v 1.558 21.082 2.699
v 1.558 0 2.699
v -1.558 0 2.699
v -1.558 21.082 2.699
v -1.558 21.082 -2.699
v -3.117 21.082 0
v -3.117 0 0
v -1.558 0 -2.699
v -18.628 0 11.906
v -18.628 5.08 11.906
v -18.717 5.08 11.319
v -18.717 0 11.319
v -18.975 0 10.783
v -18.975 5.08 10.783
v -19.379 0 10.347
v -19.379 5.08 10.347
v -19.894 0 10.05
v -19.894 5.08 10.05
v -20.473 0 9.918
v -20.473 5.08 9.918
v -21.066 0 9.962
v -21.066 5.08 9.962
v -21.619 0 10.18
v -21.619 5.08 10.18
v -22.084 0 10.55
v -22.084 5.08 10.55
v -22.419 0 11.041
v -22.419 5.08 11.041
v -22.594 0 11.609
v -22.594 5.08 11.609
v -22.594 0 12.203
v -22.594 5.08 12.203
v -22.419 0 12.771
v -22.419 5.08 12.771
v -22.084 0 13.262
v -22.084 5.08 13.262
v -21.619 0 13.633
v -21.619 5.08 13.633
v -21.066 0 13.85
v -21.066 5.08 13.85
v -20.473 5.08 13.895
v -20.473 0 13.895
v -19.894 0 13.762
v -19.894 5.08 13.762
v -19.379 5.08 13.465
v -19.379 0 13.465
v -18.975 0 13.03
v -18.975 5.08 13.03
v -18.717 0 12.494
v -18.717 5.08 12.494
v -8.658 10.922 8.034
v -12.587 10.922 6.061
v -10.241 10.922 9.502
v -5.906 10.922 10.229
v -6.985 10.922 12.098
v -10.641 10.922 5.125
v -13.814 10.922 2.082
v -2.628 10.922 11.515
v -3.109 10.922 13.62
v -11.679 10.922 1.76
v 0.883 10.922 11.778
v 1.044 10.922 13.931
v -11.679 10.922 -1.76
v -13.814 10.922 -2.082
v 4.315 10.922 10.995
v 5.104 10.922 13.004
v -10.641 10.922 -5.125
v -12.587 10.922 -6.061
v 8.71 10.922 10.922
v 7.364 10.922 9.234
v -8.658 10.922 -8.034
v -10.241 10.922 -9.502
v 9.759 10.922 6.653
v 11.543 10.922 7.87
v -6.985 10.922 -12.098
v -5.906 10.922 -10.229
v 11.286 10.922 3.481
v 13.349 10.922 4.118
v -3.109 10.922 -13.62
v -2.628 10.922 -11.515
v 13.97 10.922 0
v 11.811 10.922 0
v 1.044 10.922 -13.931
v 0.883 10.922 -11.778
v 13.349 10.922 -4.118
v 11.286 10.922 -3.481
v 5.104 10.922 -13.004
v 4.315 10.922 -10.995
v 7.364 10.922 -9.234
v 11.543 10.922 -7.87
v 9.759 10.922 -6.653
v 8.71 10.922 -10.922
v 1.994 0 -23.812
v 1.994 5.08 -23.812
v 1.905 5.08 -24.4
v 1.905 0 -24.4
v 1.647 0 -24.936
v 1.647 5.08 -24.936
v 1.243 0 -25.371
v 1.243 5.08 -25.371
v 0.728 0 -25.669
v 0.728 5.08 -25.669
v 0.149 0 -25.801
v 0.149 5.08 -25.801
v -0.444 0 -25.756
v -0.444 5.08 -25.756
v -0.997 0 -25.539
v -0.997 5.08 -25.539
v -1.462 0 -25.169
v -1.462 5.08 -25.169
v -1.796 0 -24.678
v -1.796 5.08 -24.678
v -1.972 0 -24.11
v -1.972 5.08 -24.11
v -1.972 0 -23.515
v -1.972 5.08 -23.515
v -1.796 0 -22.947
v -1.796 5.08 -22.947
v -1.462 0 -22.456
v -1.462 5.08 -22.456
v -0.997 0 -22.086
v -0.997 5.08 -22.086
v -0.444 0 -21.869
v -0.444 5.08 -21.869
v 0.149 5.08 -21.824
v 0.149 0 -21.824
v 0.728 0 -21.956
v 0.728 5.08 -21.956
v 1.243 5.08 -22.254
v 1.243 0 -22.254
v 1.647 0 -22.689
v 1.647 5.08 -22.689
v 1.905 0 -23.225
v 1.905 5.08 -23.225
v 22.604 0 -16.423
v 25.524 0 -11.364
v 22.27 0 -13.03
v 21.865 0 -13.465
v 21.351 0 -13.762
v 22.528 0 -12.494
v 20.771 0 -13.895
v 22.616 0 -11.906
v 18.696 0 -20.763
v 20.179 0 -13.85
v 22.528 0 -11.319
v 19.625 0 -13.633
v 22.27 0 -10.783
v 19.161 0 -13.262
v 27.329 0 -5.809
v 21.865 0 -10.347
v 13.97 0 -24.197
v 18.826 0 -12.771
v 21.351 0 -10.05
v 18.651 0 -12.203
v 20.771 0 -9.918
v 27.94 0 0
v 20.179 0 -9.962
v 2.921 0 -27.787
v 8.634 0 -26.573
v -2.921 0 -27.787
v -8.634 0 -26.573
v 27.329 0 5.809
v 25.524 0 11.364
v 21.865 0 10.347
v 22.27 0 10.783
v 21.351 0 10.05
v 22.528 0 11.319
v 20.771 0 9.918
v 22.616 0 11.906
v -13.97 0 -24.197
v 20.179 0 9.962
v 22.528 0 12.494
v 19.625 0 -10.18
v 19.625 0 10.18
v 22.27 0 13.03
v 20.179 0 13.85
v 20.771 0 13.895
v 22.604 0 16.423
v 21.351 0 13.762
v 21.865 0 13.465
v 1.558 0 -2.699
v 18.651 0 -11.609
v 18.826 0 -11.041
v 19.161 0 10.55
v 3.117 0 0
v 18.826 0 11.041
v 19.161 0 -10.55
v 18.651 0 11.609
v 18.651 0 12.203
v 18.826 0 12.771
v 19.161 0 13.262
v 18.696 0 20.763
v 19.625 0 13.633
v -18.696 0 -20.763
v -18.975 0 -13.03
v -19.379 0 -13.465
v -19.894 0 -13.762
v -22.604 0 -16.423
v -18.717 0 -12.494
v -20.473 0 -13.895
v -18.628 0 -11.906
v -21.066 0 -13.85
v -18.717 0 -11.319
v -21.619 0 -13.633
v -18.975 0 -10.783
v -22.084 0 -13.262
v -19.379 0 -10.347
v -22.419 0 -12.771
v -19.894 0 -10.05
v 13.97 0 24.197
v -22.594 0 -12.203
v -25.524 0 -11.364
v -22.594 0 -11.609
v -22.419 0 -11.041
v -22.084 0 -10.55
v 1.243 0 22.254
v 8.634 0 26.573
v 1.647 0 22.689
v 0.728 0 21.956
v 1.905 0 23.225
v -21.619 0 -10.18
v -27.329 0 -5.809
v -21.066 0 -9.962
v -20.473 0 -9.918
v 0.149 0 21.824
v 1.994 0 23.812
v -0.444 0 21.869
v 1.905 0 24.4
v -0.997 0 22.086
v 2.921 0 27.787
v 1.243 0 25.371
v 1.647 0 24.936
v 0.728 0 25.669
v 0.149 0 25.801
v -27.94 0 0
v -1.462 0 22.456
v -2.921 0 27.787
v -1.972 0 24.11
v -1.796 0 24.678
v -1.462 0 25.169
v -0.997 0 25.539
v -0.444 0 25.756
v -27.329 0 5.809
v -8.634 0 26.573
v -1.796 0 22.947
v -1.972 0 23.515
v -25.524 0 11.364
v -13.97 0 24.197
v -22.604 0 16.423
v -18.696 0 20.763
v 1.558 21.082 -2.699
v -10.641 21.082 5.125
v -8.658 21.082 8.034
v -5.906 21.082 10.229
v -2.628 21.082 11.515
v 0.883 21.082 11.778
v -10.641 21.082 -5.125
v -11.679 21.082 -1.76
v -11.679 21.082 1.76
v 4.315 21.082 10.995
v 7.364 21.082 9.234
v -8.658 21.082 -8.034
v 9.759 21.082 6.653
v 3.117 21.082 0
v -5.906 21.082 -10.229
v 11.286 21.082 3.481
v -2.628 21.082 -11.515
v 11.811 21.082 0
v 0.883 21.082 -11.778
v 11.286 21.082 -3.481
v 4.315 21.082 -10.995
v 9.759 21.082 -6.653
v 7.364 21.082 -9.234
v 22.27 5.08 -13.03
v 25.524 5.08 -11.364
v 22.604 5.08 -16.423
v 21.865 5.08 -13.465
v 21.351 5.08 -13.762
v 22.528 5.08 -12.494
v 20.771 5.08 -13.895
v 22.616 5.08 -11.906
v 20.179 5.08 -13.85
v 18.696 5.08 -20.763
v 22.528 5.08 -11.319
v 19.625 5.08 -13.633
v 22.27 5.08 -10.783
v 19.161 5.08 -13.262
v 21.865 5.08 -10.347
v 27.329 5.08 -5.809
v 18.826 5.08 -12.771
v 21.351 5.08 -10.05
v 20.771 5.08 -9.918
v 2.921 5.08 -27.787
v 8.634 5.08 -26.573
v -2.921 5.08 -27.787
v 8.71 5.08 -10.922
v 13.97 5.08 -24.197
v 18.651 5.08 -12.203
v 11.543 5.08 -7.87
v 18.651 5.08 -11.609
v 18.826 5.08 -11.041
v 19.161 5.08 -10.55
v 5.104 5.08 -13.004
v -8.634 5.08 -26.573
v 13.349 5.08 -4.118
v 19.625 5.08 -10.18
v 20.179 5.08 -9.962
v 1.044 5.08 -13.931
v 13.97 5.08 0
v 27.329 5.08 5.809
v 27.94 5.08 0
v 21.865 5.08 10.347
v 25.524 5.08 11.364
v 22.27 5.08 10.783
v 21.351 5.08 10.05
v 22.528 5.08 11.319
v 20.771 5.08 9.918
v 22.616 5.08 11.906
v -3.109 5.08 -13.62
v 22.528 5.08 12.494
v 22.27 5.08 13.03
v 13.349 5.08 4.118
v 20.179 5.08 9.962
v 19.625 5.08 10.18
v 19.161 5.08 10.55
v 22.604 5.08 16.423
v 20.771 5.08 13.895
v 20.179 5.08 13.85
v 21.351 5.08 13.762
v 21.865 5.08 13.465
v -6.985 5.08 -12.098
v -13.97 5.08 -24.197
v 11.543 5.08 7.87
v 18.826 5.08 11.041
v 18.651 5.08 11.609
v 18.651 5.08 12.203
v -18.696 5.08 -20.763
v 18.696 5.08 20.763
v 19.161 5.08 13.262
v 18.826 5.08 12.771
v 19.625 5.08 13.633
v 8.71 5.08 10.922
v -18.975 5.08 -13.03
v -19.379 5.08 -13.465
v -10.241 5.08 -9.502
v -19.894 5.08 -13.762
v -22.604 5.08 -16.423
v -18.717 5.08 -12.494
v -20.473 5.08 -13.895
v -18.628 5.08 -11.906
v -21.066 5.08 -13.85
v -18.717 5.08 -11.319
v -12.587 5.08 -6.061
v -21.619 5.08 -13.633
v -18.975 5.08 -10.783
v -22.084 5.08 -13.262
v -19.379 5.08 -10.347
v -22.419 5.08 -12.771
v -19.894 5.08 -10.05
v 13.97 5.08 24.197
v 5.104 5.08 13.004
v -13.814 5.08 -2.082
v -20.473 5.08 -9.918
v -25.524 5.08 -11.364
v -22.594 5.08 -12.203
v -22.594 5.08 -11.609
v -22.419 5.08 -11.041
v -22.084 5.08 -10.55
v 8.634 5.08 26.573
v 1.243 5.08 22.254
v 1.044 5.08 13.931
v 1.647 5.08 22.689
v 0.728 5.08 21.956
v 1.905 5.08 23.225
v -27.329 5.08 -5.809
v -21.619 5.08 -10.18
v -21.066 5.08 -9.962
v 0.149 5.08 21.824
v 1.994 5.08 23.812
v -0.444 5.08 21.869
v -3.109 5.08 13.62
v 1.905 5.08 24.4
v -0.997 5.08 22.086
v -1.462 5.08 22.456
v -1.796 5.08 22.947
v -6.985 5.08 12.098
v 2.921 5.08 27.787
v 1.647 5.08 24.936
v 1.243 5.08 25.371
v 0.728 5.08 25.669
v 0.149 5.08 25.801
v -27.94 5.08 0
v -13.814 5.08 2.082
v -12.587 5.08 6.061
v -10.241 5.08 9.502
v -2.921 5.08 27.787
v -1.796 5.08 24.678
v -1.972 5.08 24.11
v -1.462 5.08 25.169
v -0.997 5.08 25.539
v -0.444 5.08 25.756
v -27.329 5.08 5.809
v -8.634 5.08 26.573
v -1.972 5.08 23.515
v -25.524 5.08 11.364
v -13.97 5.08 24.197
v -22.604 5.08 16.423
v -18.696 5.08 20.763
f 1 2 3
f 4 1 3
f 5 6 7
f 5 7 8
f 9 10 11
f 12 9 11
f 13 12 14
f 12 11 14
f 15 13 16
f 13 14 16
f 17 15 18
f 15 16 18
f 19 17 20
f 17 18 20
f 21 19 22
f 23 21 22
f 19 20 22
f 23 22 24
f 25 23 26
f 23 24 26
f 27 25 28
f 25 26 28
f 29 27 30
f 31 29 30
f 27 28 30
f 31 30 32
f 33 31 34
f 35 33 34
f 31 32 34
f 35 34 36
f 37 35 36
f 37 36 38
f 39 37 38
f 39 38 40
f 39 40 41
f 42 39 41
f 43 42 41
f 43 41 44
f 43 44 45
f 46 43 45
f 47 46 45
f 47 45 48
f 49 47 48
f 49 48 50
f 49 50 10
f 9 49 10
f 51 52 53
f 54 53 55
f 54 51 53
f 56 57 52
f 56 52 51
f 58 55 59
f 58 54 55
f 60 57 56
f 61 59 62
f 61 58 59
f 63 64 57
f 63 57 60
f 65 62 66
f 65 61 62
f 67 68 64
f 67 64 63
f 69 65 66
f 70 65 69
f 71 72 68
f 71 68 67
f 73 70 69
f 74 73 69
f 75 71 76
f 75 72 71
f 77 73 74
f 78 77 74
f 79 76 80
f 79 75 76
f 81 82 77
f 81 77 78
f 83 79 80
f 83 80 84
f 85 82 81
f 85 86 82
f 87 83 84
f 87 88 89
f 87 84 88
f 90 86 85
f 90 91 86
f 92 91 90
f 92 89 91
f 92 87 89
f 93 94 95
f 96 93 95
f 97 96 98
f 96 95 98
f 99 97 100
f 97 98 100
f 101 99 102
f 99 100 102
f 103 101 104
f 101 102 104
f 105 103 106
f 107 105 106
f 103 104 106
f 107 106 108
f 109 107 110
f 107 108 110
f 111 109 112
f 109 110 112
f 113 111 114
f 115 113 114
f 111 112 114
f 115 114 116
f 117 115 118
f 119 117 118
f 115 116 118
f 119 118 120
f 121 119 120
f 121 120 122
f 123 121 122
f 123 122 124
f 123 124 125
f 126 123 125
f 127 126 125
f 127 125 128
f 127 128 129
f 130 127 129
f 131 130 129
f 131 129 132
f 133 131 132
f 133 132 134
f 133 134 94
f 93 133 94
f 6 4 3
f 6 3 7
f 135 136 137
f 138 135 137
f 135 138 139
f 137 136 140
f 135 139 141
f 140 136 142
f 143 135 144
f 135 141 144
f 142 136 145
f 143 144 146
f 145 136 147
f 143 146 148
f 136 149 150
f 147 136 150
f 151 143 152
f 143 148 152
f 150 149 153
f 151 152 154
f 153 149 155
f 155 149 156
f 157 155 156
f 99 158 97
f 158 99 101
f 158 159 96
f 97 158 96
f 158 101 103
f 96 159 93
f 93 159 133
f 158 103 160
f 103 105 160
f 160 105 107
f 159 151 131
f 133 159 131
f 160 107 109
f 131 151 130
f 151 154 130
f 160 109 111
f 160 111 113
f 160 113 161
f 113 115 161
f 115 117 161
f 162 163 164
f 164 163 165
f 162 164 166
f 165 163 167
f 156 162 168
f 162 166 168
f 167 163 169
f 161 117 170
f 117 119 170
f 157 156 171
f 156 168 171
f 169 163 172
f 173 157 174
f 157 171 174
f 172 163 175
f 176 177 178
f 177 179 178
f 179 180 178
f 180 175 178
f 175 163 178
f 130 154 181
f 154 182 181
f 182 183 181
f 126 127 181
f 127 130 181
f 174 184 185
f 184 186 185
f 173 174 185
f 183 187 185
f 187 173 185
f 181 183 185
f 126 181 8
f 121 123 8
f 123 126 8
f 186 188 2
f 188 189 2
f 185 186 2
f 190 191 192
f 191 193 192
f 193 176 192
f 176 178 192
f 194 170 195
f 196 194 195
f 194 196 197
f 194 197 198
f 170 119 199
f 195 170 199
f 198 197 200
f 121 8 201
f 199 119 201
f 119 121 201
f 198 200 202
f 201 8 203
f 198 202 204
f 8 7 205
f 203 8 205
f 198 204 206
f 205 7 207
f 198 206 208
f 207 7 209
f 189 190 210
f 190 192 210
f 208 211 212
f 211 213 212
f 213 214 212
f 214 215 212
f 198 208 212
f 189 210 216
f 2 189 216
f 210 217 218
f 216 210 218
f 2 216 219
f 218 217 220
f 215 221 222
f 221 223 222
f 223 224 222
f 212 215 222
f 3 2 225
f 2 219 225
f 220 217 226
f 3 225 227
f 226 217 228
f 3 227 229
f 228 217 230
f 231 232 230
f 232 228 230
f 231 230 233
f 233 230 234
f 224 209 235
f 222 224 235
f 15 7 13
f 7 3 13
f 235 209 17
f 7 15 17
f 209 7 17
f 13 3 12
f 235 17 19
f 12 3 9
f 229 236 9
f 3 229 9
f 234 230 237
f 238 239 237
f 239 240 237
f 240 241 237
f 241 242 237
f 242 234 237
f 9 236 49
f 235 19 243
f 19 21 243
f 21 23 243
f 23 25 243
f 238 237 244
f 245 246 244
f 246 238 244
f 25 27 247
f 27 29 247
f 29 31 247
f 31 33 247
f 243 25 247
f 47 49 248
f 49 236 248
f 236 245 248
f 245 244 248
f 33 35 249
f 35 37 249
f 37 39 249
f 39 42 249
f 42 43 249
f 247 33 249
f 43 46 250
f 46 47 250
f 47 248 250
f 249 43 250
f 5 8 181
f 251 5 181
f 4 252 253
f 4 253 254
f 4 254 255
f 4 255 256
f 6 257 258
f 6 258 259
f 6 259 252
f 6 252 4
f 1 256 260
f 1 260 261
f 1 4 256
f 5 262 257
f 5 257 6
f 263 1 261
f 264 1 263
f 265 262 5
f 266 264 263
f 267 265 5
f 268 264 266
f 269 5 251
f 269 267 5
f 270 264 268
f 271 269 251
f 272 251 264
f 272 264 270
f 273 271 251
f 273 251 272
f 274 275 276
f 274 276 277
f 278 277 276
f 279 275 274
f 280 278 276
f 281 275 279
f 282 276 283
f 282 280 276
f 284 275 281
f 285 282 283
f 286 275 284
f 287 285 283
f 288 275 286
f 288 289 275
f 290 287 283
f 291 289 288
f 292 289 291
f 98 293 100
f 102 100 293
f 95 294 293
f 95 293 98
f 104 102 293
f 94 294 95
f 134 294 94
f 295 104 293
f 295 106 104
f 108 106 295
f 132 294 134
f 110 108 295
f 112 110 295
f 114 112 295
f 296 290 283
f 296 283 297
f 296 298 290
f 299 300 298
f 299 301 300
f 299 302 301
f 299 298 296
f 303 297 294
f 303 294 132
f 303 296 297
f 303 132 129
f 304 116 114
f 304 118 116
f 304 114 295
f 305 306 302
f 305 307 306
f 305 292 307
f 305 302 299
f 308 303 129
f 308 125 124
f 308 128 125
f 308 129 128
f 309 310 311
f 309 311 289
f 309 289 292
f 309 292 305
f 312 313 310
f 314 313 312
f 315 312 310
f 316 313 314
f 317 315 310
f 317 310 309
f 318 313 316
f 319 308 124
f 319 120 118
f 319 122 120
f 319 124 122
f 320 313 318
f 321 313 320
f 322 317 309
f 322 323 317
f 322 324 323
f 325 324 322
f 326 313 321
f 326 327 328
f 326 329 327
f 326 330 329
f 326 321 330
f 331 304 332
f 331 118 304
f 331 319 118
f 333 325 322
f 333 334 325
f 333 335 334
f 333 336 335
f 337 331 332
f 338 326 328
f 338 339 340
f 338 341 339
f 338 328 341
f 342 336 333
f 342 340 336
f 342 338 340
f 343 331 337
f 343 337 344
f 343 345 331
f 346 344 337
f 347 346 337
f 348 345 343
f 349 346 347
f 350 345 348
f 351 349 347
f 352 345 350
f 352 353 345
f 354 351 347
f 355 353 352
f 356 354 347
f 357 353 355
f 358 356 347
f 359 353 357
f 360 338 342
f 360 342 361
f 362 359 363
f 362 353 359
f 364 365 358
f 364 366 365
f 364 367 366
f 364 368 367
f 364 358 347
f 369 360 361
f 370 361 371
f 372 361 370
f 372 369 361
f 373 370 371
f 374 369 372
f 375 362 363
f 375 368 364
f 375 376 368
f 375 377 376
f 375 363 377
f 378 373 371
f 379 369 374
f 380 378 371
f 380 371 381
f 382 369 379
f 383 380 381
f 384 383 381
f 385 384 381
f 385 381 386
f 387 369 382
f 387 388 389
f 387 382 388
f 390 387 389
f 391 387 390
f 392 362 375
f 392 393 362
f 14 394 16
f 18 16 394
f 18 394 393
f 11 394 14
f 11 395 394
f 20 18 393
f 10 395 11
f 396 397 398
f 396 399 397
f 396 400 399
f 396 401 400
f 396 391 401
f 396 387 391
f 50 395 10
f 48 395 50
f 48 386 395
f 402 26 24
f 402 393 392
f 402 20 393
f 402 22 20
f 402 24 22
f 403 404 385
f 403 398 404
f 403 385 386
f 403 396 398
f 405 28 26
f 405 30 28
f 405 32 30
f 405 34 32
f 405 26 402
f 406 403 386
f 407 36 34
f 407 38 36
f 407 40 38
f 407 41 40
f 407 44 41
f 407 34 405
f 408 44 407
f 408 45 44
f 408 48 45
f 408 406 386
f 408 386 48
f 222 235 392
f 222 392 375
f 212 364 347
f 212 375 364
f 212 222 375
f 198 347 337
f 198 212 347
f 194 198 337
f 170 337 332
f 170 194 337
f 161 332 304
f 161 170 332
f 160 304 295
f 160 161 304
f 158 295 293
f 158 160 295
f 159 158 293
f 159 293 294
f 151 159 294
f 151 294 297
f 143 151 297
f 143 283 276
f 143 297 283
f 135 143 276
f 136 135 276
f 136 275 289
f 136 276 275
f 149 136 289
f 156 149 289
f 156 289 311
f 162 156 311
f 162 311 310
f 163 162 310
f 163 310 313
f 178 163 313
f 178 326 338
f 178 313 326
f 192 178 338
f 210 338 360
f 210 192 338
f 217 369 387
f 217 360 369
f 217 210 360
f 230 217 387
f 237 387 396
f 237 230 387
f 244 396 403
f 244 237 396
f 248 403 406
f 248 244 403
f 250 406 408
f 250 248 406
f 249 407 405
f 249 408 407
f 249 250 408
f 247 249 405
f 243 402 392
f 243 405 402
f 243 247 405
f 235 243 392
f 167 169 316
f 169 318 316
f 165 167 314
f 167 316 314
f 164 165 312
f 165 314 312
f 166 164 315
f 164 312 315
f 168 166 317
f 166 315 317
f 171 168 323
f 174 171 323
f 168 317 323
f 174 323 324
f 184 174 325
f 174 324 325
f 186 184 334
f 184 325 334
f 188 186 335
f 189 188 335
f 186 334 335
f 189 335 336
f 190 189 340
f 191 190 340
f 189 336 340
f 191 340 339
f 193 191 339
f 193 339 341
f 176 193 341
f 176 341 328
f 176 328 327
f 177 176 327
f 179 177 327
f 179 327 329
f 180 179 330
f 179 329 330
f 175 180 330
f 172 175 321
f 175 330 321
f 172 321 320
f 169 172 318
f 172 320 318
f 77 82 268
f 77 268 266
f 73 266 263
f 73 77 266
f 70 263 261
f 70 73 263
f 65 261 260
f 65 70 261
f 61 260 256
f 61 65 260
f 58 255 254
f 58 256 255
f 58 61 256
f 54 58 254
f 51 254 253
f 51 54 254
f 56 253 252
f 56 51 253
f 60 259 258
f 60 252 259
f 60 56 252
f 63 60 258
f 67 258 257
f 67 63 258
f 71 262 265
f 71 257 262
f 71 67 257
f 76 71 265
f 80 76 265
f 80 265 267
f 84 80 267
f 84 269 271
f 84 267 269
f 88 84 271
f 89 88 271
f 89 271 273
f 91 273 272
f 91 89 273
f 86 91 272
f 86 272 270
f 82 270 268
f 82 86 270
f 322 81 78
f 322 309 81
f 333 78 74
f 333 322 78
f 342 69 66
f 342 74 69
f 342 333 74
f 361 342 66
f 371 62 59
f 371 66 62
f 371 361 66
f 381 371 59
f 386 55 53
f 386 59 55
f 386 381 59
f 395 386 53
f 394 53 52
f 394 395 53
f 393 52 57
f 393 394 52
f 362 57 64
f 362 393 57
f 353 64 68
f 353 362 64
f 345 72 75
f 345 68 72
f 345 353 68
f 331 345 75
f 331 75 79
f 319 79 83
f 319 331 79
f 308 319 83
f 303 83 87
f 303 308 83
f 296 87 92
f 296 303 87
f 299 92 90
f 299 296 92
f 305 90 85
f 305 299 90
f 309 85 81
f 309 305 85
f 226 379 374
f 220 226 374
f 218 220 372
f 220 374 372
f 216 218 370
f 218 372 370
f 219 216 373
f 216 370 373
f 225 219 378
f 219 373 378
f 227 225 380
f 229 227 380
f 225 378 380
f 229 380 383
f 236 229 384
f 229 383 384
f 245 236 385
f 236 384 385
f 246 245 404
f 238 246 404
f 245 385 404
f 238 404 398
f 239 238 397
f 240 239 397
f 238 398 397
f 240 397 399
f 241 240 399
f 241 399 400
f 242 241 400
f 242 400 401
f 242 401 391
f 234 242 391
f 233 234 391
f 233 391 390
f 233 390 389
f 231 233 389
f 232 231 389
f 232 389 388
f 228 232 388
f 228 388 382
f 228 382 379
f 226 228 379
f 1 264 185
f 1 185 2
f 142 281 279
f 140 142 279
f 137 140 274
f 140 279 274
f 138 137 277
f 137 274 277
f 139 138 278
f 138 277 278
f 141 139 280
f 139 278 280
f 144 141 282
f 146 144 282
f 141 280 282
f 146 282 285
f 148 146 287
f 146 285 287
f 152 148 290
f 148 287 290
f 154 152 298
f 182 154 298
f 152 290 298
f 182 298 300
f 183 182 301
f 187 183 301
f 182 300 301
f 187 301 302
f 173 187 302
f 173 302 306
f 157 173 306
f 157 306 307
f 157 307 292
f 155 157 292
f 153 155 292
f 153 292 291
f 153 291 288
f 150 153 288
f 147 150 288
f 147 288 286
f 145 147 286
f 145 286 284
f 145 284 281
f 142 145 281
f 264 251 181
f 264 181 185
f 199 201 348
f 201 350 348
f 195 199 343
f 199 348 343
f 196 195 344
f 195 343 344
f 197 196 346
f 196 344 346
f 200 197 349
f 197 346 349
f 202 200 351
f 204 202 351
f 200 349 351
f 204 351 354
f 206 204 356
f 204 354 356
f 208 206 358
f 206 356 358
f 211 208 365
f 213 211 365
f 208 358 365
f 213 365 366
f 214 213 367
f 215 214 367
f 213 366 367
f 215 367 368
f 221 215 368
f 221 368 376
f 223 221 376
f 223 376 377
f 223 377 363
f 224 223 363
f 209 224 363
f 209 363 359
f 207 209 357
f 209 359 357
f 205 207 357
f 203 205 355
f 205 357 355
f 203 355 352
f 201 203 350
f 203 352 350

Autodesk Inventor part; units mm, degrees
ref_plane "YZ Plane" through (0, 0, 0) normal (1, 0, 0) x (0, 1, 0)
ref_plane "XZ Plane" through (0, 0, 0) normal (0, 1, 0) x (-1, 0, 0)
ref_plane "XY Plane" through (0, 0, 0) normal (0, 0, 1) x (1, 0, 0)
sketch "Sketch1" plane through (0, 0, 0) normal (0, 1, 0) x (-1, 0, 0)
  circle A0 centre (0, 0) radius 27.94
  dimension "d0" = 55.88
extrude "Extrusion1" add sketch "Sketch1" along normal blind 5.08
sketch "Sketch2" plane through (0, 5.08, 0) normal (0, 1, 0) x (1, 0, 0)
  circle A0 centre (0, 0) radius 13.97
  dimension "d3" = 27.94
extrude "Extrusion2" add sketch "Sketch2" along normal blind 5.842
sketch "Sketch3" plane through (0, 10.922, 0) normal (0, 1, 0) x (1, 0, 0)
  circle A0 centre (0, 0) radius 11.811
  dimension "d6" = 23.622
extrude "Extrusion3" add sketch "Sketch3" along normal blind 10.16
sketch "Sketch5" plane through (0, 21.082, 0) normal (0, 1, 0) x (1, 0, 0)
  line L0 (0, 0) -> (0, 2.667)
  line L1 (-3.1168, 0) -> (-1.5584, 2.6992)
  line L2 (-1.5584, 2.6992) -> (1.5584, 2.6992)
  line L3 (1.5584, 2.6992) -> (3.1168, 0)
  line L4 (3.1168, 0) -> (1.5584, -2.6992)
  line L5 (1.5584, -2.6992) -> (-1.5584, -2.6992)
  line L6 (-1.5584, -2.6992) -> (-3.1168, 0)
  dimension "d10" = 2.667
extrude "Extrusion4" cut sketch "Sketch5" against normal blind 25.4
sketch "Sketch6" plane through (0, 5.08, 0) normal (0, 1, 0) x (1, 0, 0)
  circle A0 centre (0, 0) radius 27.94 projected
  circle A1 centre (0, 23.8125) radius 1.9939
  circle A2 centre (20.6222, 11.9063) radius 1.9939
  circle A3 centre (20.6222, -11.9063) radius 1.9939
  circle A4 centre (0, -23.8125) radius 1.9939
  circle A5 centre (-20.6222, -11.9063) radius 1.9939
  circle A6 centre (-20.6222, 11.9063) radius 1.9939
extrude "Extrusion5" cut sketch "Sketch6" against normal blind 25.4 contours A1 | A2 | A3 | A4 | A5 | A6
properties part number "Wheel Mount"
